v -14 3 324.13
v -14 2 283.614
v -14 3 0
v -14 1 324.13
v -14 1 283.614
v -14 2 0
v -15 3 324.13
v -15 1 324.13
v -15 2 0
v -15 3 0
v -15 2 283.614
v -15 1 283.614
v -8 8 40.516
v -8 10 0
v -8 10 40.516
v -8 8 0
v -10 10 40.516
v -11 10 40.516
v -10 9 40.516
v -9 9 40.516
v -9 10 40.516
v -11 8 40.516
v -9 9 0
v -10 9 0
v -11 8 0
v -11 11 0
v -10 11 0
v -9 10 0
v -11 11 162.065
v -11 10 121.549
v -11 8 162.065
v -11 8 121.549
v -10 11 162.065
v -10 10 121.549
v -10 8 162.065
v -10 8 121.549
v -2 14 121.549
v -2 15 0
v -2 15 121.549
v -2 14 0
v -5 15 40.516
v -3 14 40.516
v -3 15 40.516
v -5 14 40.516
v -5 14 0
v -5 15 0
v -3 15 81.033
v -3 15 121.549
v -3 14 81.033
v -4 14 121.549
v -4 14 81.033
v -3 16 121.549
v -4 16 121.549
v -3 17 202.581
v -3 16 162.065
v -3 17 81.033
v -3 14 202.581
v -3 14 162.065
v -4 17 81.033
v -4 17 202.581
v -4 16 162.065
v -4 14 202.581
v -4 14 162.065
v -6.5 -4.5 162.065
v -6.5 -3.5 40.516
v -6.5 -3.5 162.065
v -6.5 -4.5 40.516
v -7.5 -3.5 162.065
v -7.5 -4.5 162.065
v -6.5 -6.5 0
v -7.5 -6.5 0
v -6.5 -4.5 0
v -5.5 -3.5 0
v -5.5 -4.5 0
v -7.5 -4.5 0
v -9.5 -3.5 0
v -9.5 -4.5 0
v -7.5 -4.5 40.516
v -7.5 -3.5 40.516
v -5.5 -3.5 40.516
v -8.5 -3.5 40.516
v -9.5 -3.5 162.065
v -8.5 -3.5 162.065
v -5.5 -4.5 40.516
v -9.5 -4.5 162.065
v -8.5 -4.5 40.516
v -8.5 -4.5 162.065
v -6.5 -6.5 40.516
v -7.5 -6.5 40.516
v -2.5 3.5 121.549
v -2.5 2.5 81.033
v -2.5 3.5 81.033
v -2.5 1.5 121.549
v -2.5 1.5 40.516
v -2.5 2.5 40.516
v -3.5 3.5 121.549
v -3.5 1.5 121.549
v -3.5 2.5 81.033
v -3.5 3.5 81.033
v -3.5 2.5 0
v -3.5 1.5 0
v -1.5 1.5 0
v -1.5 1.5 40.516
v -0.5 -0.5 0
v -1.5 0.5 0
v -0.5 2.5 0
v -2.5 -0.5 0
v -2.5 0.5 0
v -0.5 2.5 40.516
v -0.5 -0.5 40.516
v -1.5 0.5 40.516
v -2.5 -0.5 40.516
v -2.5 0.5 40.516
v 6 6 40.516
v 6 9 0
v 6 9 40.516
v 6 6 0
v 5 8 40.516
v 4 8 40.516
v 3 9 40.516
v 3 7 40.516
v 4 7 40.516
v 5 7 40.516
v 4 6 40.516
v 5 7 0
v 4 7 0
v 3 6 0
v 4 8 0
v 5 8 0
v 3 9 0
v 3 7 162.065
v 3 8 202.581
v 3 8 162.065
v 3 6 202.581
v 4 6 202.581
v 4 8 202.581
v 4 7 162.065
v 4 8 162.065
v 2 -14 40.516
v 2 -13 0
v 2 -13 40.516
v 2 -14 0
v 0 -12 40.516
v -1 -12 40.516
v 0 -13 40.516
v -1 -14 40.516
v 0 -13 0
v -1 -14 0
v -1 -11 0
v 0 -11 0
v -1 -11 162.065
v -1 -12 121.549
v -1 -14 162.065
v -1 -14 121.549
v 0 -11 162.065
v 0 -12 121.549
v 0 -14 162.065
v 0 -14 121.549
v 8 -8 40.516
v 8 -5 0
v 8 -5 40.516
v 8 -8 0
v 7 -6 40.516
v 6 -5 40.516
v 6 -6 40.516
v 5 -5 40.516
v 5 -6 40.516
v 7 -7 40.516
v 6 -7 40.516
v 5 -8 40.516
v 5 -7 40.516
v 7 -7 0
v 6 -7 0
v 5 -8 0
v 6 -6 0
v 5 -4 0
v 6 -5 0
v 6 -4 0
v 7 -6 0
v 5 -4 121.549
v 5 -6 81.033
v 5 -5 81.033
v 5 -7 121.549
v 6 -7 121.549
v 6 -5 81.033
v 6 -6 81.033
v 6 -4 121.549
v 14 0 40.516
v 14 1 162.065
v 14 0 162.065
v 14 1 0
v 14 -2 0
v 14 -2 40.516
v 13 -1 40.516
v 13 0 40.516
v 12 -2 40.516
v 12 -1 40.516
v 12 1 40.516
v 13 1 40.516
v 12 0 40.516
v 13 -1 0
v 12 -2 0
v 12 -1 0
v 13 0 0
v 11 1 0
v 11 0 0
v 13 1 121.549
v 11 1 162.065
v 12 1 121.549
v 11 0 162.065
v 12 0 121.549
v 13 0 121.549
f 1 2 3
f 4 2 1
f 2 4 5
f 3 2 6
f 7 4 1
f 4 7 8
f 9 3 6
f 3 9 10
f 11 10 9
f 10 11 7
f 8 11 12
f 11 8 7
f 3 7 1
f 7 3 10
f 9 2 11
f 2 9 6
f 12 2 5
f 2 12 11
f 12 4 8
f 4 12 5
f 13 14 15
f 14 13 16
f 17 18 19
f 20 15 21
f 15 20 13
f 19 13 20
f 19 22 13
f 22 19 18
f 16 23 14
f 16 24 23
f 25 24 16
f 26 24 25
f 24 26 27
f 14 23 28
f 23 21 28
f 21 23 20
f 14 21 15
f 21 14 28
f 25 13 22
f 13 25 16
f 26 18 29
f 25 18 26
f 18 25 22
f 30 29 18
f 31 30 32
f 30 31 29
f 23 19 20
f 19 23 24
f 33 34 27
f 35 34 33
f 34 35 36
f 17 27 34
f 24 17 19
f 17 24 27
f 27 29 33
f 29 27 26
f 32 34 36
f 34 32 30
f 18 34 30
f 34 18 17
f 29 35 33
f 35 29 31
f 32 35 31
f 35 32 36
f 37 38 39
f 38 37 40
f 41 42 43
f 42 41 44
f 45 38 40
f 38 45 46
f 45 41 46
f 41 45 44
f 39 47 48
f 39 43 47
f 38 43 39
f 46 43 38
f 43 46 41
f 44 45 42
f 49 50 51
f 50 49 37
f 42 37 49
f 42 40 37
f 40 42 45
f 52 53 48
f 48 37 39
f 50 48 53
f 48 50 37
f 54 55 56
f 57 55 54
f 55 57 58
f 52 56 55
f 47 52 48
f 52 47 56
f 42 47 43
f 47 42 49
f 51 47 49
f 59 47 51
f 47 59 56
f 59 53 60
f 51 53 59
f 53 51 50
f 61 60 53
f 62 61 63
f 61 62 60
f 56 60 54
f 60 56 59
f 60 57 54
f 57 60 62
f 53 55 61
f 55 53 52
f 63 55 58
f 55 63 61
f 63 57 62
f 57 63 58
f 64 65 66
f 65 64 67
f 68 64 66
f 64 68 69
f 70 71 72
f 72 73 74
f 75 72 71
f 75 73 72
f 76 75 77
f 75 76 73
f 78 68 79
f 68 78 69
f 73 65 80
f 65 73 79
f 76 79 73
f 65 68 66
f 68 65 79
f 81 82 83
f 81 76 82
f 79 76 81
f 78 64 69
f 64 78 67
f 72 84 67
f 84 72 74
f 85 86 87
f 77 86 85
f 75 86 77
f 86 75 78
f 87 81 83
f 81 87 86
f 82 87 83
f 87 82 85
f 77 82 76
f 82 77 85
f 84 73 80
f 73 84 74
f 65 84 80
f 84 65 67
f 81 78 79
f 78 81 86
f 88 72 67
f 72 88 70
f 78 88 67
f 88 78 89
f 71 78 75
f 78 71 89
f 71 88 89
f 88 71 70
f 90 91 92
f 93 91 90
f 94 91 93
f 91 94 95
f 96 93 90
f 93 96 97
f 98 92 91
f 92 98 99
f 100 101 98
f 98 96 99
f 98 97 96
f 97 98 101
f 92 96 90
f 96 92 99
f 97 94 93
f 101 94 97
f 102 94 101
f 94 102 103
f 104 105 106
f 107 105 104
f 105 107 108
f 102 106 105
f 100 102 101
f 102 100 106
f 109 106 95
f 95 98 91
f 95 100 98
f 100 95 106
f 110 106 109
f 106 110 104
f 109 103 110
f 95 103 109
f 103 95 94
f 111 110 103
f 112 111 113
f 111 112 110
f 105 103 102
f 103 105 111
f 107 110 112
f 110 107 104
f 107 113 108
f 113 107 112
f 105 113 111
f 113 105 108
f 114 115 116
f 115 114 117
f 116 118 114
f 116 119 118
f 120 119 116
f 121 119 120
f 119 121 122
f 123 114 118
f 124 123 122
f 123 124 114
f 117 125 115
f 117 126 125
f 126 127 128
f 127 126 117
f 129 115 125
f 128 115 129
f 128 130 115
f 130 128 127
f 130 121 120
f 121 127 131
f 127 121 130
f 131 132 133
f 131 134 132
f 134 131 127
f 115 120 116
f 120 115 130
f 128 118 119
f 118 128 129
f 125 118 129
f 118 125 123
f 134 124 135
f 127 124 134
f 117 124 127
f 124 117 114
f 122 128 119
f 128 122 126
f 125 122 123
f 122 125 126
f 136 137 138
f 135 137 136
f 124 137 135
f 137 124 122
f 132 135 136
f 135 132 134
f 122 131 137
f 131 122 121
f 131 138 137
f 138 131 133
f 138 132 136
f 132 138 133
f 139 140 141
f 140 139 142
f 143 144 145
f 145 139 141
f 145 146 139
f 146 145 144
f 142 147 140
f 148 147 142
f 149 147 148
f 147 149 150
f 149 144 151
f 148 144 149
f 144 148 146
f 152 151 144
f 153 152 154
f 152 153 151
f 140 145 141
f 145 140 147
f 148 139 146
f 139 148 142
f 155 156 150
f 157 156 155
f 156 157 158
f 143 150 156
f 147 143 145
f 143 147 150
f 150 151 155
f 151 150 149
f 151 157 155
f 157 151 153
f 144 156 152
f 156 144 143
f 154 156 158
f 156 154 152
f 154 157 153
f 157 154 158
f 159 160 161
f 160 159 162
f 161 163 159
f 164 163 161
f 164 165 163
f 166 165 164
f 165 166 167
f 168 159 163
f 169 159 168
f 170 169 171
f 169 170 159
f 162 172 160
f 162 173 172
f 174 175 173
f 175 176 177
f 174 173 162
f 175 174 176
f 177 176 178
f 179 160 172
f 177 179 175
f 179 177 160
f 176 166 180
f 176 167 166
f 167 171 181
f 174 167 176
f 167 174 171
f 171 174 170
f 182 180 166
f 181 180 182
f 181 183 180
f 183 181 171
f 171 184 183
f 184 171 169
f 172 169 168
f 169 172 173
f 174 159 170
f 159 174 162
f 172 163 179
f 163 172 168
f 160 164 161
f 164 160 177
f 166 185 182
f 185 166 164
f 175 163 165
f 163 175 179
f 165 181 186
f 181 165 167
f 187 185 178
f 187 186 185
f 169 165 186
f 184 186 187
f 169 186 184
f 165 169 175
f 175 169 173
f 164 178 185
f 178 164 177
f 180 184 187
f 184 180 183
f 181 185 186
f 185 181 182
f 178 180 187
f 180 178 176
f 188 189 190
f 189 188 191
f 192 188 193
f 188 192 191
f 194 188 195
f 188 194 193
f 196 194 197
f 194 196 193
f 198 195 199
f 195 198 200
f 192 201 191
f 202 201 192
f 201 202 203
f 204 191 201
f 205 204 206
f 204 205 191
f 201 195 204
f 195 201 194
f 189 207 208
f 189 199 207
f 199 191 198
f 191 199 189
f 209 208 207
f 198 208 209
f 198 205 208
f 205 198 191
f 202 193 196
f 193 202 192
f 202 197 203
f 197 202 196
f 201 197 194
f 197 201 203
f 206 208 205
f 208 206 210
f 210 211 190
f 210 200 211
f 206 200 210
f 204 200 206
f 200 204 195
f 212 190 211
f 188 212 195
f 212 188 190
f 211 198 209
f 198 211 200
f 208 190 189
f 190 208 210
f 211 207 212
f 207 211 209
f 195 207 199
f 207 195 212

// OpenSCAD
/*
(c) 2020 Creative Common 4.0 Attribution (BY)
https://creativecommons.org/licenses/by/4.0/

!!! For best result set View -> Orthogonal in OpenSCAD !!!

Numbers such as those on te cover of "Technicheskaya estatika" 1989/12
magazine created in 3D for orhtopeojection. They can be substited according to the 
viewing angle. https://issuu.com/0083398/docs/tech_aest_1989_12

OpenSCAD 2019.05
https://github.com/adorable-monkey/tech_estetika_numbers/
*/

include <tech_estetika_numbers.scad>

/* Angel of view from angle 1-30 rather good */
$angle=1;
/* Cube edge length */
//edge=2;

/* Coefficient calculate that height of any cube
 was sqrt(2)/2 under view_angle same as angle of view */
//k=sqrt(2)/2/(cos(90-angle));

/* Change camer view parameters in code */
/* Rotation axis y and z fixed for best result */
$vpr=[$angle,0,45];
/* Translation of camera*/
//$vpt=[0,0,0];
/* Discatans of camera view */
//$vpd=80;

// Like in journal
hspace=6;
vspace=8;
translate([-(vspace+hspace),(vspace-hspace),0]) color("yellow") number_1($edge,$vert_edge_k);
translate([-vspace,vspace,0]) color("yellow") number_2($edge,$vert_edge_k);
translate([-(vspace-hspace),(vspace+hspace),0]) color("green") number_3($edge,$vert_edge_k);

translate([-hspace,-hspace,0]) color("green") number_4($edge,$vert_edge_k);
translate([0,0,0]) color("green") number_5($edge,$vert_edge_k);
translate([hspace,hspace,0]) color("green") number_6($edge,$vert_edge_k);

translate([(vspace-hspace),-(vspace+hspace),0]) color("green") number_7($edge,$vert_edge_k);
translate([vspace,-vspace,0]) color("yellow") number_8($edge,$vert_edge_k);
translate([(vspace+hspace),-(vspace-hspace),0]) color("yellow") number_9($edge,$vert_edge_k);
